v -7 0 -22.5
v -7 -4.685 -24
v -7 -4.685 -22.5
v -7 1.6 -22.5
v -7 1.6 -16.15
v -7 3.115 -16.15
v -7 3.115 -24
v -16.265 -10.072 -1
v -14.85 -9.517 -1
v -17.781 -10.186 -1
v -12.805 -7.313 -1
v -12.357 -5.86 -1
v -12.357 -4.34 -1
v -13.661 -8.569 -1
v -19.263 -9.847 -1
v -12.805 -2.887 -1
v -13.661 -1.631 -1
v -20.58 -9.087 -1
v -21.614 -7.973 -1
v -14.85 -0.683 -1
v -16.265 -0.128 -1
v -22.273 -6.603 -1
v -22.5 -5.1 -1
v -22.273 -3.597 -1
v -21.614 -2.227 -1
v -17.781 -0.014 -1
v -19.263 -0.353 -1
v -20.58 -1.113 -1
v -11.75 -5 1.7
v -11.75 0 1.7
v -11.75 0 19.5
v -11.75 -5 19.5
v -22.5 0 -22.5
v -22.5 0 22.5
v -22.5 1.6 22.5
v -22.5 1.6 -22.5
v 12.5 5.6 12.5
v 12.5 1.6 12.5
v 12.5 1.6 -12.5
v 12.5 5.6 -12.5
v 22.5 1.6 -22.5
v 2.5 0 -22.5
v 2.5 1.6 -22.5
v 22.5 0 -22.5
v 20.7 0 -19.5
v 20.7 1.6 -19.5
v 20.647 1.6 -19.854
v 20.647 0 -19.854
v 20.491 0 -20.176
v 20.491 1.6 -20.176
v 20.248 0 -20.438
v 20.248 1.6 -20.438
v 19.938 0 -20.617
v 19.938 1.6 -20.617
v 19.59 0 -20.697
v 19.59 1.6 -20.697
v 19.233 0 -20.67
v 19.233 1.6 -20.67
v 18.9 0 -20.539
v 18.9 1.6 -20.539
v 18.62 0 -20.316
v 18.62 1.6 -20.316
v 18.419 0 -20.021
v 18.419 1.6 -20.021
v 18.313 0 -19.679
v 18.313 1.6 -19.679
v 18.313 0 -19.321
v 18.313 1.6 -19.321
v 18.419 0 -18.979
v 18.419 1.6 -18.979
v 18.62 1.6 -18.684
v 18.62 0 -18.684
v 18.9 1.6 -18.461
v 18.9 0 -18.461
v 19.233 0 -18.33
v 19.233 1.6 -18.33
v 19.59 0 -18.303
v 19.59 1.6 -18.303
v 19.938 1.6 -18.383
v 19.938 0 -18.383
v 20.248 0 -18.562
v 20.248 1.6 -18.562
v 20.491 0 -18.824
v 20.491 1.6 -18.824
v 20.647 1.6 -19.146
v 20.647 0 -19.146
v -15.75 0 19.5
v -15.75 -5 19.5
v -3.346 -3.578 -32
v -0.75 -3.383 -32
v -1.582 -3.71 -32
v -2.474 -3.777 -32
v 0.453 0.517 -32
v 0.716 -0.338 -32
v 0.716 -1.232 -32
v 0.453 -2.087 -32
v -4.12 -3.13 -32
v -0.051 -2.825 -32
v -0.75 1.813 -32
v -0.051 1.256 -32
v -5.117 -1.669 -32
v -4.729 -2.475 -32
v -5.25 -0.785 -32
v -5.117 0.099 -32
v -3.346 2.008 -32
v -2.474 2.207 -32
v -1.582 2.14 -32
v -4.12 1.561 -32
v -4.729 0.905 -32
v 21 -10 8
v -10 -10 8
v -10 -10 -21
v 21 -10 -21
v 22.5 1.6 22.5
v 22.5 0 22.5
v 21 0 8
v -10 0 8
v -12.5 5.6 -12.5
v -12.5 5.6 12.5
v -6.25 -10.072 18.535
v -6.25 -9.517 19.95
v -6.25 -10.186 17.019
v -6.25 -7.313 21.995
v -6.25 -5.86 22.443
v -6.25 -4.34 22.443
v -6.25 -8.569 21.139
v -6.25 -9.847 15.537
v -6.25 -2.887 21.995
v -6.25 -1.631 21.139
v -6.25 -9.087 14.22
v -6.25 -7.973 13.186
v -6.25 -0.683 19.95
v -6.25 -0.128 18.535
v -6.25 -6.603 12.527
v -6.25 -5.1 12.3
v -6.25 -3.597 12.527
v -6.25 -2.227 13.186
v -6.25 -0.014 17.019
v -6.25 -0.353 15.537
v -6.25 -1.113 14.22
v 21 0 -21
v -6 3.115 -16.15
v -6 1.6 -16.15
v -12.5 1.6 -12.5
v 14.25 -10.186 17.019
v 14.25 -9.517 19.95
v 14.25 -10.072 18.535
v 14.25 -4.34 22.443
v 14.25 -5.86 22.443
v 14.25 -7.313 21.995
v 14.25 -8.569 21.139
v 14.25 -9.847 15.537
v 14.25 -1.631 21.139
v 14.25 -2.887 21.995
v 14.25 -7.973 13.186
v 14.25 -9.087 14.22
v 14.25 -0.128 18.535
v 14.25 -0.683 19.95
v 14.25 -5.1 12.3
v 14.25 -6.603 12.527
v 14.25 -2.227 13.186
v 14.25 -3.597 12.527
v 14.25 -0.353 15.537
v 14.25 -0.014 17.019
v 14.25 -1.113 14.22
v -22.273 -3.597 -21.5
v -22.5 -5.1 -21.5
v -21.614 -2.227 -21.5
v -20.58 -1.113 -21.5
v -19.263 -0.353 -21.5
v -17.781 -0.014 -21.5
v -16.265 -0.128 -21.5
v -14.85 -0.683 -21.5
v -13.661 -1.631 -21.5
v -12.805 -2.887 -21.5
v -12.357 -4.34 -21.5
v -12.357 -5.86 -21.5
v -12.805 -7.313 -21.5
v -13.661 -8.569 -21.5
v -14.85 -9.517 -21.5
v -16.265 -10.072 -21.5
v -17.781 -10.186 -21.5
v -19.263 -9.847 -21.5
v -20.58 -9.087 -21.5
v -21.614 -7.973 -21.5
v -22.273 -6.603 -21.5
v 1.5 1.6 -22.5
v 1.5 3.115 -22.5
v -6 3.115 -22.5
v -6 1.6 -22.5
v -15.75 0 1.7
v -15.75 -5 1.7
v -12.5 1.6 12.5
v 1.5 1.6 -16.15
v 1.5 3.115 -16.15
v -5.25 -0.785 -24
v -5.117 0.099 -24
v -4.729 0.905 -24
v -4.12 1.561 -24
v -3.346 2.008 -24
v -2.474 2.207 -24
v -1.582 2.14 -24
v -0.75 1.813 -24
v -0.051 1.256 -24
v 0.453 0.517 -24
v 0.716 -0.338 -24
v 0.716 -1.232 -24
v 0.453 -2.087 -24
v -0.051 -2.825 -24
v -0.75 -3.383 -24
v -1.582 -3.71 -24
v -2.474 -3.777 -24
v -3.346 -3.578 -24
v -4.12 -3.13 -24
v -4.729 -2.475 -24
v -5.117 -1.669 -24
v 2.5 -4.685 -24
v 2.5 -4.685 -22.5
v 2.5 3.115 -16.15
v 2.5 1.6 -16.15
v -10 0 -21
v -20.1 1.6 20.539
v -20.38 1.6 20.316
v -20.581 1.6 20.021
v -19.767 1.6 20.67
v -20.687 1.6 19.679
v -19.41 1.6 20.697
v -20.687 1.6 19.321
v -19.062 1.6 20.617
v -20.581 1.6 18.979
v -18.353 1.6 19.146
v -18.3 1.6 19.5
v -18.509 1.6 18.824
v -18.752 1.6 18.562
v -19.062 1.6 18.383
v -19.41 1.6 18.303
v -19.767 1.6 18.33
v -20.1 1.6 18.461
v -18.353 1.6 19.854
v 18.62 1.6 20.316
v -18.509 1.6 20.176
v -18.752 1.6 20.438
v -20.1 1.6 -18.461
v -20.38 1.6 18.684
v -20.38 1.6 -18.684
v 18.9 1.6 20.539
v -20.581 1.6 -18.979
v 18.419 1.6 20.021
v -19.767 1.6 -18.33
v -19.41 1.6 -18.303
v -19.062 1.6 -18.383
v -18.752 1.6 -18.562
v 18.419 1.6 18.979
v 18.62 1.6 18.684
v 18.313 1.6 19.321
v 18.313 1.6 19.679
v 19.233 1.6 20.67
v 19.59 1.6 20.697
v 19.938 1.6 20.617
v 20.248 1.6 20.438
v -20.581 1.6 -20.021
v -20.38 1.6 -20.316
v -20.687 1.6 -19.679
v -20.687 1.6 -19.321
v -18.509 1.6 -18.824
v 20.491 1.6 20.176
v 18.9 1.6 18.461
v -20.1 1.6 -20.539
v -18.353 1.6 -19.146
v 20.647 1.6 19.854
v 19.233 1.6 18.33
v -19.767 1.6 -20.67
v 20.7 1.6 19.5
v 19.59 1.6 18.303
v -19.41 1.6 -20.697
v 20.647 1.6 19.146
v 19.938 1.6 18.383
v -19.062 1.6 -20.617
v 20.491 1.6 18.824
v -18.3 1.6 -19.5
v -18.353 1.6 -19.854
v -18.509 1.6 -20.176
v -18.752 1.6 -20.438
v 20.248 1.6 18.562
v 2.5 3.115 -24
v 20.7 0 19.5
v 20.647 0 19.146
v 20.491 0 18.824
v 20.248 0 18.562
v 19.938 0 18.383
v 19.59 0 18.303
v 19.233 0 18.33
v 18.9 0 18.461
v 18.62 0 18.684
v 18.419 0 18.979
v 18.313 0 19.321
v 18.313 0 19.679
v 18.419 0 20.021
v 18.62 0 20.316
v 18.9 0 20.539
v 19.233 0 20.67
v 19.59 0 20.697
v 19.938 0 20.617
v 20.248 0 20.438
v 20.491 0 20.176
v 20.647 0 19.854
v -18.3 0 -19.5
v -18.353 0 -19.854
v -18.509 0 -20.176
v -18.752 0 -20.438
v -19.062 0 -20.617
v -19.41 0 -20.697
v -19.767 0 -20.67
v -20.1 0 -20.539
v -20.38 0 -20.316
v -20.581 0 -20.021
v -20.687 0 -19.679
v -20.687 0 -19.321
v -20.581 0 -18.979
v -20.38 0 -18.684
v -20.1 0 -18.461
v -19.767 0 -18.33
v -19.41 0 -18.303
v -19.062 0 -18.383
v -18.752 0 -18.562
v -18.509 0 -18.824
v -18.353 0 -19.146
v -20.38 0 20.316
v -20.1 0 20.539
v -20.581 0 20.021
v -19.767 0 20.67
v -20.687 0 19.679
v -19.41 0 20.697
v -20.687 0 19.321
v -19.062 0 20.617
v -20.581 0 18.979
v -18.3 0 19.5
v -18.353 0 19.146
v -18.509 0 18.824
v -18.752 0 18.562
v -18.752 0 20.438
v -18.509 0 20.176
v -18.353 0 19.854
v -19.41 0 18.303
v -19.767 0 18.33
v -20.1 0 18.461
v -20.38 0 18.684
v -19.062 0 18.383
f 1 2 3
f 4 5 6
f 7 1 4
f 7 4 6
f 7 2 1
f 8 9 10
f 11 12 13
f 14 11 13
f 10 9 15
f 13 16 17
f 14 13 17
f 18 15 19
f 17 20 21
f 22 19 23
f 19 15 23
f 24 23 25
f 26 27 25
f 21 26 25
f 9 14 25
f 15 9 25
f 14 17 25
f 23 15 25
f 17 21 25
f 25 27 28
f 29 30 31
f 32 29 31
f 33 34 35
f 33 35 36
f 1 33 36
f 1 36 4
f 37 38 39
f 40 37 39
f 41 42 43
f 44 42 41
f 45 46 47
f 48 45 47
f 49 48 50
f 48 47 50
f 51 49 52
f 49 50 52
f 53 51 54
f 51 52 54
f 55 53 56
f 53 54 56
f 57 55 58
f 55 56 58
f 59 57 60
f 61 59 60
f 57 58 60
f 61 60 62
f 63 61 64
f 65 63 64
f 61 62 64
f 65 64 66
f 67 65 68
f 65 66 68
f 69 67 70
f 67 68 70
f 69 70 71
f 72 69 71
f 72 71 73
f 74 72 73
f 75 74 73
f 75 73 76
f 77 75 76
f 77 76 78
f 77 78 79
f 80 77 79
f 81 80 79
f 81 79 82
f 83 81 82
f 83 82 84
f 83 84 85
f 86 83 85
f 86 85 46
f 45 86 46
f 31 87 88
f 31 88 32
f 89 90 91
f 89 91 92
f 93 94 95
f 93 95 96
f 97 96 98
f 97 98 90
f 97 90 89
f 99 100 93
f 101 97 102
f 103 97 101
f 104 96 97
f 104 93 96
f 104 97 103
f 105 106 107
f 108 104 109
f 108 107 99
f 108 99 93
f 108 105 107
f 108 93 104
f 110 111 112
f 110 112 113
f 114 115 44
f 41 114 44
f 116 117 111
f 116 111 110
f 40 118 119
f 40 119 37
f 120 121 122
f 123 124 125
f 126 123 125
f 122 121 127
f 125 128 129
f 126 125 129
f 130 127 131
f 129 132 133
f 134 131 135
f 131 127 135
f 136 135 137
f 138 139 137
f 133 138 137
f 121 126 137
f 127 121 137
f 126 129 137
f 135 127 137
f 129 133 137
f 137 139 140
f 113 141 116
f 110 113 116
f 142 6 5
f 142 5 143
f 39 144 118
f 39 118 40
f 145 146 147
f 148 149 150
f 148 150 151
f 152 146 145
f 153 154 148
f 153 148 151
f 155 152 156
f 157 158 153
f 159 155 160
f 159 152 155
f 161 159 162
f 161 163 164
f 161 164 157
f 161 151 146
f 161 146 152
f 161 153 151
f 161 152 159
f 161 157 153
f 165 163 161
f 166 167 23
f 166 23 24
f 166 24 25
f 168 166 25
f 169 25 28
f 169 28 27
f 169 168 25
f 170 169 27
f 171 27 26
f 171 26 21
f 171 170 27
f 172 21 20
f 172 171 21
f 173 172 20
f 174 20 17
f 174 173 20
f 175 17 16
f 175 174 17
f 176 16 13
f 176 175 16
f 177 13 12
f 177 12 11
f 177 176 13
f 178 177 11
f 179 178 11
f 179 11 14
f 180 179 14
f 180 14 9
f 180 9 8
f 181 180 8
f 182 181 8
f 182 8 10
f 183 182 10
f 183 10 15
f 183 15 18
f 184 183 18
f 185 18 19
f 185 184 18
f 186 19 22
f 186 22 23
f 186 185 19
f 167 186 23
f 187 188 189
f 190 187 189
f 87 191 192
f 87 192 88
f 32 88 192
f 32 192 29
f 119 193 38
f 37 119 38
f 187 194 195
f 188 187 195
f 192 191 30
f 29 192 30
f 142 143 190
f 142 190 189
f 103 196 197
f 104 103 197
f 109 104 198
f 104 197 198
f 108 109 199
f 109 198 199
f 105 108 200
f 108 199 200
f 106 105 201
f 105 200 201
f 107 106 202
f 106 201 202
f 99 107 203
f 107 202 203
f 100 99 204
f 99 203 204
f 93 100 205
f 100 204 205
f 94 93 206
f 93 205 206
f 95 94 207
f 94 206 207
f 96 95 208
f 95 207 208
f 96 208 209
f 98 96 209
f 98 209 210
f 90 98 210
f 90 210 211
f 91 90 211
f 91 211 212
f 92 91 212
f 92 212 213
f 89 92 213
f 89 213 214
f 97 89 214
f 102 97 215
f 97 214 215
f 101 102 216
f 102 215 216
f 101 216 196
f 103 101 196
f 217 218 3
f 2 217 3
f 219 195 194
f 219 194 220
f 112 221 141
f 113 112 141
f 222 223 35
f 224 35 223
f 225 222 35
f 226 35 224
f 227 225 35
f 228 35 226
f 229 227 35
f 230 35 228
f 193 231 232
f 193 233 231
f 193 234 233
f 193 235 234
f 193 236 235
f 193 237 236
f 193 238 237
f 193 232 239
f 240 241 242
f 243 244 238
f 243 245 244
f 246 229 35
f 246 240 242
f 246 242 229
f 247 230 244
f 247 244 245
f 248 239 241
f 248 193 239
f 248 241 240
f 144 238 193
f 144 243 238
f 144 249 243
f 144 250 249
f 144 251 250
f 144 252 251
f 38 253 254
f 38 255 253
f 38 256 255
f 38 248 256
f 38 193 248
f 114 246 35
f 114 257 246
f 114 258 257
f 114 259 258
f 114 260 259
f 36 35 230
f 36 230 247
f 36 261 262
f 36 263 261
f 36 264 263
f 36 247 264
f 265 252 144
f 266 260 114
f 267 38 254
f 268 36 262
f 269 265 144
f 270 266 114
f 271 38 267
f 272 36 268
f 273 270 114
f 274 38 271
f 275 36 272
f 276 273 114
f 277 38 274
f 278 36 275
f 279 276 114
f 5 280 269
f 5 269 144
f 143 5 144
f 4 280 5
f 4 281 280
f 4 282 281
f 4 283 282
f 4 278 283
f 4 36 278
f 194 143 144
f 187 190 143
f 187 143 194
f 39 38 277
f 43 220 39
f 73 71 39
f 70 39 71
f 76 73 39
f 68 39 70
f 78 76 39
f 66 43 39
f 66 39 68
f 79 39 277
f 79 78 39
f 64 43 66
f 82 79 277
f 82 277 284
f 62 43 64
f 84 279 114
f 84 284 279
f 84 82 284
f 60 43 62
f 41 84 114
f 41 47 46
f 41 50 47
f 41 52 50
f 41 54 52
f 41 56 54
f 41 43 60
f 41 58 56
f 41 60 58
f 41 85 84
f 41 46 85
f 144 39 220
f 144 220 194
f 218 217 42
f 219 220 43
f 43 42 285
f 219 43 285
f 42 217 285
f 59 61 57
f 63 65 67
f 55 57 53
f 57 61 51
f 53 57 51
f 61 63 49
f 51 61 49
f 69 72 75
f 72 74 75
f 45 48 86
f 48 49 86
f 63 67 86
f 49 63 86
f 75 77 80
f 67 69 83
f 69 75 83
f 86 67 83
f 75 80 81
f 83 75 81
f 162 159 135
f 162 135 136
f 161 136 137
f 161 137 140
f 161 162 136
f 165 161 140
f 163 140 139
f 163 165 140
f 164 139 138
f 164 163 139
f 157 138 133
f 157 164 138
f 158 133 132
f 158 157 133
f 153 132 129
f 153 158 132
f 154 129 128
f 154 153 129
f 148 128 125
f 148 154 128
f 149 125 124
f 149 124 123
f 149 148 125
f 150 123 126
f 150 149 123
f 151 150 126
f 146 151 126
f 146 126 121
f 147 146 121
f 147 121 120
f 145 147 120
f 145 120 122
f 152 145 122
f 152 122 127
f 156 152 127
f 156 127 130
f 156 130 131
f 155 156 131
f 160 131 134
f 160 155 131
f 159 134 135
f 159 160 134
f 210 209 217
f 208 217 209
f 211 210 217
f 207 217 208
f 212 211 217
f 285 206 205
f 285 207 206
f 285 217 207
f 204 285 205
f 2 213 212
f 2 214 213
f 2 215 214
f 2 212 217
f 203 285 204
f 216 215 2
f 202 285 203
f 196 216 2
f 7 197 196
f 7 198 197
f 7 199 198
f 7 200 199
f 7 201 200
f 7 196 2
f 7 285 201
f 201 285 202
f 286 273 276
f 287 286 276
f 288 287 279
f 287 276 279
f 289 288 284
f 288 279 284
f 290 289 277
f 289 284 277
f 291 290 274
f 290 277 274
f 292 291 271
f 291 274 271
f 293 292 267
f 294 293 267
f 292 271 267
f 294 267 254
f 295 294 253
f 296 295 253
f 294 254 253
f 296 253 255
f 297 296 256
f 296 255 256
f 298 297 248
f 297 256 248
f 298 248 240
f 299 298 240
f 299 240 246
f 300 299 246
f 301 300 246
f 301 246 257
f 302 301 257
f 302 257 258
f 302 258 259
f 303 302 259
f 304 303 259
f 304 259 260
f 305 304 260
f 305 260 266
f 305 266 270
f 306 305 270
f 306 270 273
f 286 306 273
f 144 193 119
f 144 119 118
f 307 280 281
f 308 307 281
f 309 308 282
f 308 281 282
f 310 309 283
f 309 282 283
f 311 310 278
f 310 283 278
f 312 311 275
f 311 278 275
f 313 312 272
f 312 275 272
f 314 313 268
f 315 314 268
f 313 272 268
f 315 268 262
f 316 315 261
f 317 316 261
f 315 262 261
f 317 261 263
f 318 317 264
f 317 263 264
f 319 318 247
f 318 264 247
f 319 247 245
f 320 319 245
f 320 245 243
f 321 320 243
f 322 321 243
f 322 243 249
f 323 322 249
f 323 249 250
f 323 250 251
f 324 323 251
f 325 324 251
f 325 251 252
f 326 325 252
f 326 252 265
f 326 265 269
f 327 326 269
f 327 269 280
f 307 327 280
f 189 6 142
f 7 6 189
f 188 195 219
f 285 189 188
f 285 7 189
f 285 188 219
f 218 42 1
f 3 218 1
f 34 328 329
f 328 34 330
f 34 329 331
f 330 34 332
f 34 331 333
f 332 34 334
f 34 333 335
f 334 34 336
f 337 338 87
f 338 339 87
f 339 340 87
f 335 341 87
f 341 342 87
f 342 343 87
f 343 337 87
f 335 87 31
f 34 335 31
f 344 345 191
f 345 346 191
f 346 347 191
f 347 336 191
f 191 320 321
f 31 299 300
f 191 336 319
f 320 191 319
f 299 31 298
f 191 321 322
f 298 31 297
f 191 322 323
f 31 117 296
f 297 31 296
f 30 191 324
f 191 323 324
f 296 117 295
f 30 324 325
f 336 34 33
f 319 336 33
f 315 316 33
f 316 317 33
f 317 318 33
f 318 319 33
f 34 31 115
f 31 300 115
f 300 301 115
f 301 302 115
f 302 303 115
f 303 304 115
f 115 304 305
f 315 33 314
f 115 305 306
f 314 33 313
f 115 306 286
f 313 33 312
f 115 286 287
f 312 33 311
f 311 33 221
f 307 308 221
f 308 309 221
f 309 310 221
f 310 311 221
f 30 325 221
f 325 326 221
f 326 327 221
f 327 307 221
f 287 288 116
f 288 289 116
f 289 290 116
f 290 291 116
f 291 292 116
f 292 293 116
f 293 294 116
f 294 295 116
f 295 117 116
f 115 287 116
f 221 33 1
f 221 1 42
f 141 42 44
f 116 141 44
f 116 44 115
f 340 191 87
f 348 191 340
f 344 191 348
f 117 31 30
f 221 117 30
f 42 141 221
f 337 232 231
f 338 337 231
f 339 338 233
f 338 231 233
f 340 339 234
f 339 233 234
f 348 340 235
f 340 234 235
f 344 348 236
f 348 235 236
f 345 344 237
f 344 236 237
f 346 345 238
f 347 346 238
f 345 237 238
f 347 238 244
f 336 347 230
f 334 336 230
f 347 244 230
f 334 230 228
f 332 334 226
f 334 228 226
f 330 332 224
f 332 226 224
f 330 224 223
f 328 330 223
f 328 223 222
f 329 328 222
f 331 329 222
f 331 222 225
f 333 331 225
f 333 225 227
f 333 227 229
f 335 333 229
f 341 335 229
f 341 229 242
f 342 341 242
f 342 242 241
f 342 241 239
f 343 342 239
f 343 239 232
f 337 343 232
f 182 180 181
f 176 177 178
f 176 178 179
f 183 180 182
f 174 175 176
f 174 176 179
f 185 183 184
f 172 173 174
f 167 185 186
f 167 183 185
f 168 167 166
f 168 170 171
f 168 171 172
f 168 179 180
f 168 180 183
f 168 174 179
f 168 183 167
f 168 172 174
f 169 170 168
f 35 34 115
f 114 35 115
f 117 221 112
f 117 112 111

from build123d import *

# Parameters (mm, degrees)
SKETCH1_W                    = 45
SKETCH1_H                    = 45
PCB_DEPTH                    = 1.6
PCB_MOUNTING_HOLES_D         = 2.4
SKETCH4_W                    = 31
SKETCH4_H                    = 29
IRIDIUM_MODEM_DEPTH          = 10
CAPACITOR_START              = -8.25
SKETCH5_R                    = 5.1
CAPACITOR_1_DEPTH            = 20.5
CAPACITOR_START_2            = -1
SKETCH6_R                    = 5.1
CAPACITOR_2_DEPTH            = 20.5
SKETCH7_W                    = 9.5
SKETCH7_H                    = 7.8
BOSS_EXTRUDE5_DEPTH          = 1.5
SKETCH8_R                    = 3
BOSS_EXTRUDE6_DEPTH          = 8
SKETCH9_W                    = 1
SKETCH9_H                    = 1.515102308
BOSS_EXTRUDE7_DEPTH          = 6.35
SKETCH10_W                   = 4
SKETCH10_H                   = 17.8
MOLEX_PICOBLADE_10_POS_DEPTH = 5
SKETCH11_W                   = 25
SKETCH11_H                   = 25
ANTENNA_DEPTH                = 4


with BuildPart() as part:
    # Sketch1 → PCB (new body)
    with BuildSketch(Plane(origin=(0, 0, 0), x_dir=(1, 0, 0), z_dir=(0, 1, 0))):
        Rectangle(SKETCH1_W, SKETCH1_H)
    extrude(amount=PCB_DEPTH)

    # PCB mounting holes (through all)
    with Locations(Plane(origin=(0, 0, 0), x_dir=(-1, 0, 0), z_dir=(0, -1, 0))):
        with Locations((-19.5, -19.5), (19.5, 19.5), (19.5, -19.5), (-19.5, 19.5)):
            Hole(PCB_MOUNTING_HOLES_D / 2)

    # Sketch4 → Iridium Modem (add)
    with BuildSketch(Plane.XZ):
        with Locations((5.5, -6.5)):
            Rectangle(SKETCH4_W, SKETCH4_H)
    extrude(amount=IRIDIUM_MODEM_DEPTH)

    # Sketch7 → Boss-Extrude5 (add)
    with BuildSketch(Plane(origin=(0, 0, -22.5), x_dir=(-1, 0, 0), z_dir=(0, 0, -1))):
        with Locations((2.25, -0.784897692)):
            Rectangle(SKETCH7_W, SKETCH7_H)
    extrude(amount=BOSS_EXTRUDE5_DEPTH)

    # Sketch8 → Boss-Extrude6 (add)
    with BuildSketch(Plane(origin=(0, 0, -24), x_dir=(-1, 0, 0), z_dir=(0, 0, -1))):
        with Locations((2.25, -0.784897692)):
            Circle(SKETCH8_R)
    extrude(amount=BOSS_EXTRUDE6_DEPTH)

    # Sketch9 → Boss-Extrude7 (add)
    with BuildSketch(Plane.XY.offset(-22.5)):
        with Locations((-6.5, 2.357551154)):
            Rectangle(SKETCH9_W, SKETCH9_H)
        with Locations((2, 2.357551154)):
            Rectangle(SKETCH9_W, SKETCH9_H)
    extrude(amount=BOSS_EXTRUDE7_DEPTH)

    # Sketch10 → Molex picoblade 10 pos (add)
    with BuildSketch(Plane.XZ):
        with Locations((-13.75, 10.6)):
            Rectangle(SKETCH10_W, SKETCH10_H)
    extrude(amount=MOLEX_PICOBLADE_10_POS_DEPTH)

    # Sketch11 → Antenna (add)
    with BuildSketch(Plane(origin=(0, 1.6, 0), x_dir=(1, 0, 0), z_dir=(0, 1, 0))):
        Rectangle(SKETCH11_W, SKETCH11_H)
    extrude(amount=ANTENNA_DEPTH)


with BuildPart() as body_2:
    # Sketch5 → Capacitor 1 (new body)
    with BuildSketch(Plane(origin=(22.5, 0, 0), x_dir=(0, 0, -1), z_dir=(1, 0, 0)).offset(CAPACITOR_START)):
        with Locations((-17.4, -5.1)):
            Circle(SKETCH5_R)
    extrude(amount=-CAPACITOR_1_DEPTH)


with BuildPart() as body_3:
    # Sketch6 → Capacitor 2 (new body)
    with BuildSketch(Plane(origin=(0, 0, -22.5), x_dir=(-1, 0, 0), z_dir=(0, 0, -1)).offset(CAPACITOR_START_2)):
        with Locations((17.4, -5.1)):
            Circle(SKETCH6_R)
    extrude(amount=-CAPACITOR_2_DEPTH)


solid = Compound([part.part, body_2.part, body_3.part])
